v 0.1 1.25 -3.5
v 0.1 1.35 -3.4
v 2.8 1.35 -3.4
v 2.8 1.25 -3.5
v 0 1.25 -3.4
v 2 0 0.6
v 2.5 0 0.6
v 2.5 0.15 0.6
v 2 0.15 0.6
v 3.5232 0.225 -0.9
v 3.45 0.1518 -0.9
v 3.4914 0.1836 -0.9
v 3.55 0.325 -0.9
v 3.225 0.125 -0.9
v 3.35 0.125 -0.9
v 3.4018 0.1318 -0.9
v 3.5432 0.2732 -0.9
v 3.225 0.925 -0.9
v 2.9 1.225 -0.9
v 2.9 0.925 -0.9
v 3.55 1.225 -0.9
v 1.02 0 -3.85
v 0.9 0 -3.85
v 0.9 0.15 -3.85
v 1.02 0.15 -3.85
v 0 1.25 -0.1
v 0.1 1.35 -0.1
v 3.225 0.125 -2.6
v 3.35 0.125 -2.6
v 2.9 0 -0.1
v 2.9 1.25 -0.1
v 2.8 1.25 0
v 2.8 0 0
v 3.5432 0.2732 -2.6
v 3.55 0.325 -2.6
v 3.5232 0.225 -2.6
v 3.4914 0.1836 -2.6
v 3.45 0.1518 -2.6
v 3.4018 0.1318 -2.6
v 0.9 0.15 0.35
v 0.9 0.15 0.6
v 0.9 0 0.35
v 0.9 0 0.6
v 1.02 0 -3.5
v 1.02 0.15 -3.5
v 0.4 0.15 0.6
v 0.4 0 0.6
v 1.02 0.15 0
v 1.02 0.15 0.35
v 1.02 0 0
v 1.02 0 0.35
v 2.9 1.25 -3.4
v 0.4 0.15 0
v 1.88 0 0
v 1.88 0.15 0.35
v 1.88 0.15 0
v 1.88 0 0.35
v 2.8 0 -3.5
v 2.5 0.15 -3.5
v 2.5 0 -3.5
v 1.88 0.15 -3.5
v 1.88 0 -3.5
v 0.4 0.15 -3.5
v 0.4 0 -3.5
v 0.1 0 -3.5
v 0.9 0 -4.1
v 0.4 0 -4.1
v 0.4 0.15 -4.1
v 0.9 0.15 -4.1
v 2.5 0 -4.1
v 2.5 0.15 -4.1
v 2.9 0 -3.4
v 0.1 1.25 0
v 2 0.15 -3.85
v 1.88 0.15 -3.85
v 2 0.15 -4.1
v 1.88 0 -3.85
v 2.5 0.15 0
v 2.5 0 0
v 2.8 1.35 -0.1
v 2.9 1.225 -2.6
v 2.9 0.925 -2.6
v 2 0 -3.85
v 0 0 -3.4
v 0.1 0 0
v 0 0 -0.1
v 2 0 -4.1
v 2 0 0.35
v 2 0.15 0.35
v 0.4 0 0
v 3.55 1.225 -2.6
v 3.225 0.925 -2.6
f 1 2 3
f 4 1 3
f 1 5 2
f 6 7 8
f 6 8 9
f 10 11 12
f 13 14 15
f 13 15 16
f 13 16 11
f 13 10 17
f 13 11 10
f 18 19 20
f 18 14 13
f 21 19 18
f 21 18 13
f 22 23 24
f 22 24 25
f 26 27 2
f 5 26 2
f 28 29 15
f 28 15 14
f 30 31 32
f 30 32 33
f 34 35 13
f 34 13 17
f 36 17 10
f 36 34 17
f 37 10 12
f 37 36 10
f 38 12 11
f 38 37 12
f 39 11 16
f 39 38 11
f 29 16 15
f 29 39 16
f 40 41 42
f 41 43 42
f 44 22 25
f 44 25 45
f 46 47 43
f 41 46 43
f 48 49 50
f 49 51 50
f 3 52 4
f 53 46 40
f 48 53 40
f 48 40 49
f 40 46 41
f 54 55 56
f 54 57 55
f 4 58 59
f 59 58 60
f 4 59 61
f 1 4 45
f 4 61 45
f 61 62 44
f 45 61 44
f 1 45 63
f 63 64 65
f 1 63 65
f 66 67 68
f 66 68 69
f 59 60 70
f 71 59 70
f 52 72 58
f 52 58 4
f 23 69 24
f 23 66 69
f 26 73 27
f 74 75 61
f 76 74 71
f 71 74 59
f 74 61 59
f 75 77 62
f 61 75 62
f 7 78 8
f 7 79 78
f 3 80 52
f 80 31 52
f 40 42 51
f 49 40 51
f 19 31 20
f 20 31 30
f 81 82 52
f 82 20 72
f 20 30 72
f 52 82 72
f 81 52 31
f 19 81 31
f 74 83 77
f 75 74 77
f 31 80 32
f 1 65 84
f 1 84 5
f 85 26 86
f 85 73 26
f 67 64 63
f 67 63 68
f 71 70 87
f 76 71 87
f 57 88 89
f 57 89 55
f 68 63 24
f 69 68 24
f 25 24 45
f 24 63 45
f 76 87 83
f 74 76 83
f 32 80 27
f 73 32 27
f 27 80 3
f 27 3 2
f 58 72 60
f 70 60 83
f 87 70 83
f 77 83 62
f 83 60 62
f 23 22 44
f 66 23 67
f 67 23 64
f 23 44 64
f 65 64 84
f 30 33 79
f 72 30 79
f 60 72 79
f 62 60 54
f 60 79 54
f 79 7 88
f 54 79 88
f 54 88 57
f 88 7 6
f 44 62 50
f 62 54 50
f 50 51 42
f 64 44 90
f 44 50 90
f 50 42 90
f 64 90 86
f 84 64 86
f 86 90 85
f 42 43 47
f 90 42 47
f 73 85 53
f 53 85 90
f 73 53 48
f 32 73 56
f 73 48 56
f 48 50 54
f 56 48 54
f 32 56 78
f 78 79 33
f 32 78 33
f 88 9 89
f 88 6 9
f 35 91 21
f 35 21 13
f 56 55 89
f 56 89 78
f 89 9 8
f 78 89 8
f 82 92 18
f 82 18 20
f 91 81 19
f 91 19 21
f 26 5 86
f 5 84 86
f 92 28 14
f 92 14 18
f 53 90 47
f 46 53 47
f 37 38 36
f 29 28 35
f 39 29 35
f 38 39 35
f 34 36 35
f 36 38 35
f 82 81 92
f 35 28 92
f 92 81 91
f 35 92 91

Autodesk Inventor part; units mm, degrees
ref_plane "YZ Plane" through (0, 0, 0) normal (1, 0, 0) x (0, 1, 0)
ref_plane "XZ Plane" through (0, 0, 0) normal (0, 1, 0) x (-1, 0, 0)
ref_plane "XY Plane" through (0, 0, 0) normal (0, 0, 1) x (1, 0, 0)
sketch "Sketch1" plane through (0, 0, 0) normal (0, 1, 0) x (-1, 0, 0)
  line L0 (0, 0) -> (-2.9, 0)
  line L1 (-2.9, 0) -> (-2.9, -3.5)
  line L2 (-2.9, -3.5) -> (0, -3.5)
  line L3 (0, -3.5) -> (0, 0)
  dimension "d0" = 2.9
  dimension "d1" = 3.5
extrude "Extrusion1" add sketch "Sketch1" along normal blind 1.35
sketch "Sketch2" plane through (0, 0, 0) normal (0, -1, 0) x (1, 0, 0)
  line L0 (0.4, -3.5) -> (0.4, -4.1)
  line L1 (0.4, -4.1) -> (0.9, -4.1)
  line L2 (0.9, -4.1) -> (0.9, -3.85)
  line L3 (0.9, -3.85) -> (1.02, -3.85)
  line L4 (1.02, -3.85) -> (1.02, -3.5)
  line L5 (1.02, -3.5) -> (0.4, -3.5)
  line L6 (2.9, -3.5) -> (0, -3.5) projected
  line L7 (0, -3.5) -> (0, 0) construction
  line L8 (0, -1.75) -> (2.9, -1.75) construction
  line L9 (0, 0) -> (2.9, 0) construction
  line L10 (1.45, 0) -> (1.45, -3.5) construction
  line L11 (2.5, -3.5) -> (2.5, -4.1)
  line L12 (2.5, -4.1) -> (2, -4.1)
  line L13 (2, -4.1) -> (2, -3.85)
  line L14 (2, -3.85) -> (1.88, -3.85)
  line L15 (1.88, -3.85) -> (1.88, -3.5)
  line L16 (1.88, -3.5) -> (2.5, -3.5)
  line L17 (2.9, -3.5) -> (2.9, 0) construction
  line L18 (0.4, 0) -> (0.4, 0.6)
  line L19 (0.4, 0.6) -> (0.9, 0.6)
  line L20 (0.9, 0.6) -> (0.9, 0.35)
  line L21 (0.9, 0.35) -> (1.02, 0.35)
  line L22 (1.02, 0.35) -> (1.02, 0)
  line L23 (1.02, 0) -> (0.4, 0)
  line L24 (2.5, 0) -> (2.5, 0.6)
  line L25 (2.5, 0.6) -> (2, 0.6)
  line L26 (2, 0.6) -> (2, 0.35)
  line L27 (2, 0.35) -> (1.88, 0.35)
  line L28 (1.88, 0.35) -> (1.88, 0)
  line L29 (1.88, 0) -> (2.5, 0)
  dimension "d4" = 0.62
  dimension "d5" = 0.5
  dimension "d6" = 0.25
  dimension "d7" = 4.7
  dimension "d8" = 0.86
extrude "Extrusion2" add sketch "Sketch2" against normal blind 0.15
chamfer "Chamfer1" distance 0.1 angle 45 8 edges at (2.9, 1.35, -1.75) (1.45, 1.35, 0) (2.9, 0.675, 0) (2.9, 0.675, -3.5) (0, 0.675, 0) (0, 1.35, -1.75) (0, 0.675, -3.5) (1.45, 1.35, -3.5)
ref_plane "Work Plane1" through (0.1, 1.35, -1.75) normal (0, 0, 1) x (1, 0, 0)
sketch "Sketch3" plane through (0.1, 1.35, -1.75) normal (0, 0, 1) x (1, 0, 0)
  line L0 (2.8, -0.125) -> (3.45, -0.125)
  line L1 (3.45, -0.125) -> (3.45, -1.025)
  line L2 (3.25, -1.225) -> (3.125, -1.225)
  line L3 (3.125, -1.225) -> (3.125, -0.425)
  line L4 (3.125, -0.425) -> (2.8, -0.425)
  line L5 (2.8, -0.425) -> (2.8, -0.125)
  line L6 (3.125, -0.125) -> (3.125, -0.425) construction
  arc A0 (3.25, -1.225) -> (3.45, -1.025) centre (3.25, -1.025) ccw
  line L7 (1.48, -0.1666) -> (1.78, -0.1666) construction
  line L8 (2.8, -1.35) -> (2.8, -0.1) projected
  line L9 (2.7, 0) -> (0, 0) projected
  line L10 (2.4, -1.35) -> (2.7, -1.35) projected
  line L11 (-0.1, -0.1) -> (-0.1, -1.35) projected
  dimension "d15" = 0.2
  dimension "d16" = 1.1
  dimension "d17" = 0.3
  dimension "d23" = 0.125
  dimension "d24" = 0.125
  dimension "d25" = 3.55
extrude "Extrusion3" add sketch "Sketch3" along normal mid plane 1.7
ref_plane "Work Plane2" through (1.45, 1.25, -3.5) normal (1, 0, 0) x (0, 0, -1)
equation "\"d23\" = d24"
properties part number "Push-button"
